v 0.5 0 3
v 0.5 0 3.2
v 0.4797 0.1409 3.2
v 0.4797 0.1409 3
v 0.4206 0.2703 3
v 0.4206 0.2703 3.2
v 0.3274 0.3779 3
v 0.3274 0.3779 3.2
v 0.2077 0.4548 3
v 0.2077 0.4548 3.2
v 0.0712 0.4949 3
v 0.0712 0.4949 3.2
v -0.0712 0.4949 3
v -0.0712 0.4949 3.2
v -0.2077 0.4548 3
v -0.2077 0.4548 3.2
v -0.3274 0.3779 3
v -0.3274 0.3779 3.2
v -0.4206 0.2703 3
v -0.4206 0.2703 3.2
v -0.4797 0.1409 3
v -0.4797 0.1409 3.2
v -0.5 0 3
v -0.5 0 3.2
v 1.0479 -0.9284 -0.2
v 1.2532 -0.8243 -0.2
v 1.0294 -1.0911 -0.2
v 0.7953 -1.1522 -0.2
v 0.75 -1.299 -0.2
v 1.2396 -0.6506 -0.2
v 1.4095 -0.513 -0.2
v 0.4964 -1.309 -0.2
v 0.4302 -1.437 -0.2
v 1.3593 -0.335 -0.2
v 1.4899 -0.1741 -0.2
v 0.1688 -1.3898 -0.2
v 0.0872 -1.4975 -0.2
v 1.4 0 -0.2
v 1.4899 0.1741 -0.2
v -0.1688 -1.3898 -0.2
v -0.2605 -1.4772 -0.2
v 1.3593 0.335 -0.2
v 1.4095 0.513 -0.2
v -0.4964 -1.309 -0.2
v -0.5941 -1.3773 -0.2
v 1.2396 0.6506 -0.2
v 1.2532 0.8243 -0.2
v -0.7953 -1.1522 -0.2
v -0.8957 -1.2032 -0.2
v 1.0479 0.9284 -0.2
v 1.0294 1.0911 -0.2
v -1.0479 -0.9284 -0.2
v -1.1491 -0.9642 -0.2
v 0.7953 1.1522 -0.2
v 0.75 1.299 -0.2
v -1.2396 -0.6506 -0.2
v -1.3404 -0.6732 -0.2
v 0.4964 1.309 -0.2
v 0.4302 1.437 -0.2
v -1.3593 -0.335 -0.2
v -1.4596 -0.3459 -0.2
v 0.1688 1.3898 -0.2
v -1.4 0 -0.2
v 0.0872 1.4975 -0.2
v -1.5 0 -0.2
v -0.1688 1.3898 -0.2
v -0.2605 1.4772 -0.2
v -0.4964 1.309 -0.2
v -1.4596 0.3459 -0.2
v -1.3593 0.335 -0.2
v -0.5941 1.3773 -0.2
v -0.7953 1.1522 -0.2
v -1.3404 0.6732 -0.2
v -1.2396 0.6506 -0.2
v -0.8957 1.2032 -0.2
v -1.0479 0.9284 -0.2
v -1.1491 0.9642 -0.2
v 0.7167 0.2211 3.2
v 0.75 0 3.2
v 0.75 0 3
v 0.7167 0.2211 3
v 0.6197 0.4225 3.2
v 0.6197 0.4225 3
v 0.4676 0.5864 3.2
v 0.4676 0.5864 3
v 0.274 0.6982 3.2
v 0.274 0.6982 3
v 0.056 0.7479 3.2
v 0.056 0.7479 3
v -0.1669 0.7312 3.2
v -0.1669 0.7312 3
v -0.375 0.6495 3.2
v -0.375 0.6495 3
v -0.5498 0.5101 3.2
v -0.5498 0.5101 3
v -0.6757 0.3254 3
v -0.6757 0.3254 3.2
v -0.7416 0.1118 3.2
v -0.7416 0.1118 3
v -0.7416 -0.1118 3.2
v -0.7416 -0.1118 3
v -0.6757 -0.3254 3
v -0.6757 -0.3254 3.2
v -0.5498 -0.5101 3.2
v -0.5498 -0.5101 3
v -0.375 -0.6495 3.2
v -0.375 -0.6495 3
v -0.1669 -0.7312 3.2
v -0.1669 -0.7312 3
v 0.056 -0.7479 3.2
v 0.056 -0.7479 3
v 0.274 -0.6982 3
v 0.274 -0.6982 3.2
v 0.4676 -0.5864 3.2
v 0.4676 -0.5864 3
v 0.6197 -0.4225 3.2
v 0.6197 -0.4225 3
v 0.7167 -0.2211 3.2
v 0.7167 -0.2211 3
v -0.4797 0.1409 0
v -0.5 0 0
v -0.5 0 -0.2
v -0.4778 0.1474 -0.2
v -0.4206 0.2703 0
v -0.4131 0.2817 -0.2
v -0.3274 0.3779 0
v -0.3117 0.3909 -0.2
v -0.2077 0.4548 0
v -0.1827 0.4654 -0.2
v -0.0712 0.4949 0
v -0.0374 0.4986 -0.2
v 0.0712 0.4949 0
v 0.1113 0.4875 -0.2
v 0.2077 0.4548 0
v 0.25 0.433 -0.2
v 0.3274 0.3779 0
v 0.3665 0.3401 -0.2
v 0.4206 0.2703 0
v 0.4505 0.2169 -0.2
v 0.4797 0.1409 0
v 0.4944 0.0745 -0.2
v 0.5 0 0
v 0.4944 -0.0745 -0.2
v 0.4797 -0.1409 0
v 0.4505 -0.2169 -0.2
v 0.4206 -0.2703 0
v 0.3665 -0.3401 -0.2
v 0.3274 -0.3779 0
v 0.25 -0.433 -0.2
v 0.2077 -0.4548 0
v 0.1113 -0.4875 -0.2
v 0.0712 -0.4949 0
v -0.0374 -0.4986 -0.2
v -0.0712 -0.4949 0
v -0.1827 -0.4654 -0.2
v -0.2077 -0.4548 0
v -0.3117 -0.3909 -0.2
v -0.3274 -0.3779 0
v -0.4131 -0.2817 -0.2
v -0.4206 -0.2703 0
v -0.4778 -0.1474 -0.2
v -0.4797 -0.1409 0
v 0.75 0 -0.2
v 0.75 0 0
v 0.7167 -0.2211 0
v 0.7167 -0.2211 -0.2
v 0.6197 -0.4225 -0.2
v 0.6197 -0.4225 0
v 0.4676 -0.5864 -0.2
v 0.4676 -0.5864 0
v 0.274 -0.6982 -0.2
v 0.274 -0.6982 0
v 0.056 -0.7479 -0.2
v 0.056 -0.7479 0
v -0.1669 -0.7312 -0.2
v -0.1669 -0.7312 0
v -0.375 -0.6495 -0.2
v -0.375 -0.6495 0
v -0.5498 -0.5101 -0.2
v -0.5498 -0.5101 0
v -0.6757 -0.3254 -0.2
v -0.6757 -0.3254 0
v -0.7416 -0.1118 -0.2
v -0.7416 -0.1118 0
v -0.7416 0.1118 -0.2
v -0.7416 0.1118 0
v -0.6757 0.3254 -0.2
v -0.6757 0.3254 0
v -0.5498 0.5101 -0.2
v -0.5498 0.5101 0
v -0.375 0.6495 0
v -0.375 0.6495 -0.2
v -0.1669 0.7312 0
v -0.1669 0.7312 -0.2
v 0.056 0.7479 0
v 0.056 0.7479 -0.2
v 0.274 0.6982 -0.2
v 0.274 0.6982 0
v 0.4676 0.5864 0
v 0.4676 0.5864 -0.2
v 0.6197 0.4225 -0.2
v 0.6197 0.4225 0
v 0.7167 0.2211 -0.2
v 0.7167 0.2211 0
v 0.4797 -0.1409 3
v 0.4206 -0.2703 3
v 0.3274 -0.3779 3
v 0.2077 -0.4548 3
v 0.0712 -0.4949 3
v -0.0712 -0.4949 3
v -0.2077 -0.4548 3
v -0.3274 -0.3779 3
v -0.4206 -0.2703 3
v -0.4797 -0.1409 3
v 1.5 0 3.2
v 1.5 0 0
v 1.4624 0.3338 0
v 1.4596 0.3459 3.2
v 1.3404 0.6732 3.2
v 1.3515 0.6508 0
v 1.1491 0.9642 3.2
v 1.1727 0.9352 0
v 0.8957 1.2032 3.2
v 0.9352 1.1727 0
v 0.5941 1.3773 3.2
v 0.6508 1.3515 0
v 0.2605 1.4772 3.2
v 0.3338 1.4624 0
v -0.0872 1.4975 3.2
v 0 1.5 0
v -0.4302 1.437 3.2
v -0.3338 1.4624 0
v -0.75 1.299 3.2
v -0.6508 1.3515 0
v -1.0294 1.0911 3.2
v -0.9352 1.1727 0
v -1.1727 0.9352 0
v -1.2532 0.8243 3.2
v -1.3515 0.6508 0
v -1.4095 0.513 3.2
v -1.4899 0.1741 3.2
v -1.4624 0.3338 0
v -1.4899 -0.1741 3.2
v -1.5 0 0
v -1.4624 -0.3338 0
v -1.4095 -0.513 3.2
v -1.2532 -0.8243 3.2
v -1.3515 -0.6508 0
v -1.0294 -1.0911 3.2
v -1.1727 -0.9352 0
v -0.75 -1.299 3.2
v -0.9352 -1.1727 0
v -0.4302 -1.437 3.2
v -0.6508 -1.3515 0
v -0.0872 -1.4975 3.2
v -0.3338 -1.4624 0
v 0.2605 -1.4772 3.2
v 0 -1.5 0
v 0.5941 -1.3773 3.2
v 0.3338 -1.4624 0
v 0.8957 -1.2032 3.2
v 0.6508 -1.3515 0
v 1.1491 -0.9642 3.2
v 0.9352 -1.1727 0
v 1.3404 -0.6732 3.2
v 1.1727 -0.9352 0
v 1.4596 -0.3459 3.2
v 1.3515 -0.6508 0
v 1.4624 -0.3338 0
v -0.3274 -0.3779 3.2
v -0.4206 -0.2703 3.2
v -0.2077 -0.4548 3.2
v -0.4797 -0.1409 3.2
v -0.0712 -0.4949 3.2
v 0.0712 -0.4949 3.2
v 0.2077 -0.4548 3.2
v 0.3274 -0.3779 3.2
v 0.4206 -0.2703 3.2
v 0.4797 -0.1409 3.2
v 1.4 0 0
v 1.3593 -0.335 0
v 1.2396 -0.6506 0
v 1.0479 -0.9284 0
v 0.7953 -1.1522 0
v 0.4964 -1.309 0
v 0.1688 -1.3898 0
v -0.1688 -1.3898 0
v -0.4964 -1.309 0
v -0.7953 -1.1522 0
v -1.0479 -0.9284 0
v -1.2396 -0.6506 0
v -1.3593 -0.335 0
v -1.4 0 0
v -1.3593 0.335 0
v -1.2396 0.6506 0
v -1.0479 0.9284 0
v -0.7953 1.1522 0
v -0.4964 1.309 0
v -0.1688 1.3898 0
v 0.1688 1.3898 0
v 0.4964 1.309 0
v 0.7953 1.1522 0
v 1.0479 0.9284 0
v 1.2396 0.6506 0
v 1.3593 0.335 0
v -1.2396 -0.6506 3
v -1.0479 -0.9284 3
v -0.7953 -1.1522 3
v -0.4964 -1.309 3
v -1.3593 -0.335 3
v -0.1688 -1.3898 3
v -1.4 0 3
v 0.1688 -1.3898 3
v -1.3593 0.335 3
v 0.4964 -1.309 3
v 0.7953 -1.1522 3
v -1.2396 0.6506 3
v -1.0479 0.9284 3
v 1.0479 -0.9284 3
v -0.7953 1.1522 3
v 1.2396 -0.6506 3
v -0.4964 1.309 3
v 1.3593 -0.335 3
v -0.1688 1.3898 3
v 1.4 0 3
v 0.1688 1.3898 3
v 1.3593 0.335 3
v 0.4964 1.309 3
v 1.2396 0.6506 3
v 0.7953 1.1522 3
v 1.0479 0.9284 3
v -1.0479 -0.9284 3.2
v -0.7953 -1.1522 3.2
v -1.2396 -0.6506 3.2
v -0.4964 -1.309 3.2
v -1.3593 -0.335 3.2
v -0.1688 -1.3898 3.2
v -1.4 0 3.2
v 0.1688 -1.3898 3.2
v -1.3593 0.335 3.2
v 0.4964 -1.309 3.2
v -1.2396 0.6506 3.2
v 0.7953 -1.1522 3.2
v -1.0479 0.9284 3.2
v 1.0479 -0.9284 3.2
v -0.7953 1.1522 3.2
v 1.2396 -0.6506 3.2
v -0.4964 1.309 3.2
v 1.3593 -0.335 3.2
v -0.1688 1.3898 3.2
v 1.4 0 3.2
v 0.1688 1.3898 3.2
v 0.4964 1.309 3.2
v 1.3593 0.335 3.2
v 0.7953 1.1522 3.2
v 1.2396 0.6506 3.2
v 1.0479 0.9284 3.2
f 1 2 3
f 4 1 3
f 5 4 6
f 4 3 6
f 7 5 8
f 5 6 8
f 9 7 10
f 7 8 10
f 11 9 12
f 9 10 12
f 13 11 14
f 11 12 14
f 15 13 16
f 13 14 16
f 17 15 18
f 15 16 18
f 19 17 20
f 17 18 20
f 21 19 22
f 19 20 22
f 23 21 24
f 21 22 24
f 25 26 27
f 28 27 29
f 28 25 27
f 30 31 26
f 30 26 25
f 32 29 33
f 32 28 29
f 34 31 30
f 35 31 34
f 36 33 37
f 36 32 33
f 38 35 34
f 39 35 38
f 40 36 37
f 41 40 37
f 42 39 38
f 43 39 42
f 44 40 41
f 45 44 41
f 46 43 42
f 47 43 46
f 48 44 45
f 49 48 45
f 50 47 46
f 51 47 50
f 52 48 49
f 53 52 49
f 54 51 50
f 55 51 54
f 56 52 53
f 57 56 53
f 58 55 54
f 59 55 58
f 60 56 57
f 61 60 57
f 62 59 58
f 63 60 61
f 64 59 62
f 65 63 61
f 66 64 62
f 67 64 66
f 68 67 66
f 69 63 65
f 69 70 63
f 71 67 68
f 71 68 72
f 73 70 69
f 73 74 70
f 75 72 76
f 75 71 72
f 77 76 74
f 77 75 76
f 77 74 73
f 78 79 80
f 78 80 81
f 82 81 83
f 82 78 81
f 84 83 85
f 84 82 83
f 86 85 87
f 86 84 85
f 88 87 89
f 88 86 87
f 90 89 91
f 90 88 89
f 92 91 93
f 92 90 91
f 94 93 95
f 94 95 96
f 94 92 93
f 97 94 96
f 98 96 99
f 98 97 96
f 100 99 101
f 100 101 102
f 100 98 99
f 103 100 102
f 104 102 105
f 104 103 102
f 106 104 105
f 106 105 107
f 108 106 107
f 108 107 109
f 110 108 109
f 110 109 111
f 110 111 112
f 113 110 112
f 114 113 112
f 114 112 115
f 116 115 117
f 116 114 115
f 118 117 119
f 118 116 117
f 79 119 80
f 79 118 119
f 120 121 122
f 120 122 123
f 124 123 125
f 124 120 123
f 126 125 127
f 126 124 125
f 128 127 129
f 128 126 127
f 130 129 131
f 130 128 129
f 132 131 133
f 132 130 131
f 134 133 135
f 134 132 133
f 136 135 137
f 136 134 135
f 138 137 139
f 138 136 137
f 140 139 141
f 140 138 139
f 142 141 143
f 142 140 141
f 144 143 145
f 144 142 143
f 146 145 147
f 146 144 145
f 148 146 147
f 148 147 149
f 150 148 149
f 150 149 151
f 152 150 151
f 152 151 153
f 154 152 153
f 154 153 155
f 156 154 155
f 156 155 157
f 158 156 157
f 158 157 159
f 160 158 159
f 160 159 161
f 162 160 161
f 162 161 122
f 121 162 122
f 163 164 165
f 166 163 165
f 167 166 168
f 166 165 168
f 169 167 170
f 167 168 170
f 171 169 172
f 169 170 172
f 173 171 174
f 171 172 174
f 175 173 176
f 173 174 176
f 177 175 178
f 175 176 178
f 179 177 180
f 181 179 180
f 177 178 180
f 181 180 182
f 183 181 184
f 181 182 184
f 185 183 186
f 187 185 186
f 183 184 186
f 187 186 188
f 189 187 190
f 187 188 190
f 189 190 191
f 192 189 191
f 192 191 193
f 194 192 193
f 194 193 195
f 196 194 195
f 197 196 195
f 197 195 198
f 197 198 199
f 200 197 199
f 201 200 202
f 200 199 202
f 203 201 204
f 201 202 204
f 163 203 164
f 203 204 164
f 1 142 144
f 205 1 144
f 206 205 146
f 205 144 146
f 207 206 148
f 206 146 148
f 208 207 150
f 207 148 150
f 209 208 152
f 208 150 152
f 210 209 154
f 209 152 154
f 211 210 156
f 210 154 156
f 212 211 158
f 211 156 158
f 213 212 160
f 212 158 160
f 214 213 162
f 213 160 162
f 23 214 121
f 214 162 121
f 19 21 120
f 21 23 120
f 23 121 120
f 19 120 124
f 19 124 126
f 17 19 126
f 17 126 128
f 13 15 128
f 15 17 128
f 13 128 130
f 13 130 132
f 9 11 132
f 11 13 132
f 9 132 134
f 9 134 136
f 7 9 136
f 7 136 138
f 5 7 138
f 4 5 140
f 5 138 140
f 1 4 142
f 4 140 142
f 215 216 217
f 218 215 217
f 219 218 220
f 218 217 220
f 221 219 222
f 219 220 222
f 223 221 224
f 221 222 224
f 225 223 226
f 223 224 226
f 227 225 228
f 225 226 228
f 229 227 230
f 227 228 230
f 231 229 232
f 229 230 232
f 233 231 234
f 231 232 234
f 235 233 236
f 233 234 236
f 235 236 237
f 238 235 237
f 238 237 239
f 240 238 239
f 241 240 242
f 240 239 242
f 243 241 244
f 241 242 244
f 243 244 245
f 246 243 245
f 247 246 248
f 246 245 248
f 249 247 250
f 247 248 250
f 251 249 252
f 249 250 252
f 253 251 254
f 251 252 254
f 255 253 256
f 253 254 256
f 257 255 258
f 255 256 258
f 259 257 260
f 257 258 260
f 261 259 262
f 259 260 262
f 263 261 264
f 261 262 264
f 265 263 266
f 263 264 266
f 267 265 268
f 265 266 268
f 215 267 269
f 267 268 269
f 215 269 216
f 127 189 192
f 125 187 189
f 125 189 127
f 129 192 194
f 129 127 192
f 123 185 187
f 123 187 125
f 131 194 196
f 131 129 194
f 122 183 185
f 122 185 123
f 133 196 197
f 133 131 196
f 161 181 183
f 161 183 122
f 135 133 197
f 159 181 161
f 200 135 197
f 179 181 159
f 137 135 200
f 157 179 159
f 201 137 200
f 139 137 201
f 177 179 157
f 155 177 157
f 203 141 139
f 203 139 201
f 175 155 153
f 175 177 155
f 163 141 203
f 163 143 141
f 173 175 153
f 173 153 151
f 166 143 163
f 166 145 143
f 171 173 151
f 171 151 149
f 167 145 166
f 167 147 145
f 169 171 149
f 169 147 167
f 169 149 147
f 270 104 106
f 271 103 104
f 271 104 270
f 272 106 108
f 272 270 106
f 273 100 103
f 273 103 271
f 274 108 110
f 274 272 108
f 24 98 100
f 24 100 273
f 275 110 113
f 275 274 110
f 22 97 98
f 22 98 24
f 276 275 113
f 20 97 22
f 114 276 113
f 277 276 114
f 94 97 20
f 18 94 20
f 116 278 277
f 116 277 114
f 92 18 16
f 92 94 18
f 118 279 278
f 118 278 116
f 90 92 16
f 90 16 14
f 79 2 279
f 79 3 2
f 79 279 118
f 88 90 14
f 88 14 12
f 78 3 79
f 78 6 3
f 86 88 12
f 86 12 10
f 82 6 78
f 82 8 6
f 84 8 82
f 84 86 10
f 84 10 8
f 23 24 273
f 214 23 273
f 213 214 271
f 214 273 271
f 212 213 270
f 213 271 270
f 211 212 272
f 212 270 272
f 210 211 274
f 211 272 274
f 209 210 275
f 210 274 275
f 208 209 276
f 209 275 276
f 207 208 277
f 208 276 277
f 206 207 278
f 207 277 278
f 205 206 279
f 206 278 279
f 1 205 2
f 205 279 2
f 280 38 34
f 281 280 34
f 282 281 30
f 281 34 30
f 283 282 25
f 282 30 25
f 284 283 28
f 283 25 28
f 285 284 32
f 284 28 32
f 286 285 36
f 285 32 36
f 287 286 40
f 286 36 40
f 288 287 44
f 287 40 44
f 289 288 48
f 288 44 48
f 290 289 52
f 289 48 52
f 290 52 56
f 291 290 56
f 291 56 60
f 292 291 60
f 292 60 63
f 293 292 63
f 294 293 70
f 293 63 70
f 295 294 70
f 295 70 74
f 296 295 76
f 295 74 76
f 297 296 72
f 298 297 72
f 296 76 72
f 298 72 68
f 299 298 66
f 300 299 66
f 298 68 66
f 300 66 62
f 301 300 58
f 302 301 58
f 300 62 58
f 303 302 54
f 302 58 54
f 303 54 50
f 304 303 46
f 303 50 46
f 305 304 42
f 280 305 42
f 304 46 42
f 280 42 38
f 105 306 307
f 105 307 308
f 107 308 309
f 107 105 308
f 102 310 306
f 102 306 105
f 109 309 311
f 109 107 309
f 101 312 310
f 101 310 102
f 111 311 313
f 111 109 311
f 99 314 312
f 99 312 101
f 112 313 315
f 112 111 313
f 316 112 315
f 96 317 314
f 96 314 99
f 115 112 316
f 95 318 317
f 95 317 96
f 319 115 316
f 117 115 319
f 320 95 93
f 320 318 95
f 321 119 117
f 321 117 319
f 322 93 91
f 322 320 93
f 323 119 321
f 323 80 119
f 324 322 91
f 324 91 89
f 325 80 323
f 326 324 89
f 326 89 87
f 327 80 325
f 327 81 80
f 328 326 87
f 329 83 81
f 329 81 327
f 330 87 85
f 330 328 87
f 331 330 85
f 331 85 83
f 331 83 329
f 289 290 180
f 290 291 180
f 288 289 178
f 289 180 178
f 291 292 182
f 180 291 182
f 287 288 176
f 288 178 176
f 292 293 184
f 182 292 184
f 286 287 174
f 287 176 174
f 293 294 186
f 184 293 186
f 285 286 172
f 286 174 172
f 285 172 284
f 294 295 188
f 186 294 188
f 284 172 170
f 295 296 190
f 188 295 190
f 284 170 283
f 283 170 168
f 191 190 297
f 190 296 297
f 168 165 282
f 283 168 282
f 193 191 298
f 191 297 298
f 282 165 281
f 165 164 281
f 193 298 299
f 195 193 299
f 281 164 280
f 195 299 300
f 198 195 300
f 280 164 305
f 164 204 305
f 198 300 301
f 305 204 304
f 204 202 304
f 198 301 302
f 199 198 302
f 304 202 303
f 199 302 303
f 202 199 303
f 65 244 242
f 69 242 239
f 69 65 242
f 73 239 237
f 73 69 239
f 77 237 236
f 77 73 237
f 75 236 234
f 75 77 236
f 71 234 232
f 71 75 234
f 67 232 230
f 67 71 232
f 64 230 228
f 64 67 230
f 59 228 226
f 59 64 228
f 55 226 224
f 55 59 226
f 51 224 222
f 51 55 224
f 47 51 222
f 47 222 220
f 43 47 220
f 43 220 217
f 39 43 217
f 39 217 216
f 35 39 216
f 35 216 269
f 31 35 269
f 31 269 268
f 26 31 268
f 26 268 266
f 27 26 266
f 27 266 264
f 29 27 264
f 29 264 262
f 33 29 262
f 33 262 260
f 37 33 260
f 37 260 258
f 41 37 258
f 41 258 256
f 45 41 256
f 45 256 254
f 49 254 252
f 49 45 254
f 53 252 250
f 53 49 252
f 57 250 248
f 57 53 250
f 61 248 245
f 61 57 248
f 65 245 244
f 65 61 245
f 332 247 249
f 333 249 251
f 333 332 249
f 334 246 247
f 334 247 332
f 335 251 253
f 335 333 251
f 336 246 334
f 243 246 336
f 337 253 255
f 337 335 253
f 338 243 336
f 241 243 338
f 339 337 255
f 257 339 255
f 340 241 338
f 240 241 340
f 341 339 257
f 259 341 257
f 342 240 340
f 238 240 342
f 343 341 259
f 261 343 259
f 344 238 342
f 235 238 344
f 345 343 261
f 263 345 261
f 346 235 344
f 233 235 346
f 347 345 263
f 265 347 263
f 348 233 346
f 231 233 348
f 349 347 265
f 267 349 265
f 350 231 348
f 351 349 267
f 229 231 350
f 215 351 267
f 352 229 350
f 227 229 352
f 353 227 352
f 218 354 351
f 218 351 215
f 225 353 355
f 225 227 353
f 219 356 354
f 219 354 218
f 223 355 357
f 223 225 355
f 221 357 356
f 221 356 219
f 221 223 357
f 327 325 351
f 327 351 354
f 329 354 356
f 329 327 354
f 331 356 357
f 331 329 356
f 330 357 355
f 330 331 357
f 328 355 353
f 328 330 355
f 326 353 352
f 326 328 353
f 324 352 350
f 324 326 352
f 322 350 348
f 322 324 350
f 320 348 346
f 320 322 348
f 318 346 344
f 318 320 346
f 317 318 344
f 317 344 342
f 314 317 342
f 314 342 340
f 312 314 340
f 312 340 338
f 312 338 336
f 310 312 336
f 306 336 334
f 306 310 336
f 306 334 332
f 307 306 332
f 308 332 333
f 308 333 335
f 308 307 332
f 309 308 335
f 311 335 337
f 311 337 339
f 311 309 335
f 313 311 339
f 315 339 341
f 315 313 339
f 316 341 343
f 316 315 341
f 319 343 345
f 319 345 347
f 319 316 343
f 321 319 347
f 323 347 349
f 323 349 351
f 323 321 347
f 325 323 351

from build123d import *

# Parameters (mm, degrees)
SKETCH_1_R          = 1.5
EXTRUDE_1_DEPTH     = 3
SKETCH_2_R          = 1.5
SKETCH_2_R_2        = 1.4
EXTRUDE_2_DEPTH     = 0.2
EXTRUDE_START       = 0.2
SKETCH_3_R          = 1.5
SKETCH_3_R_2        = 1.4
EXTRUDE_3_DEPTH     = 0.2
SKETCH_4_R          = 0.75
SKETCH_4_R_2        = 0.5
EXTRUDE_4_DEPTH     = 0.2
SKETCH_5_R          = 0.75
SKETCH_5_R_2        = 0.5
EXTRUDE_5_DEPTH     = 0.2
SKETCH_7_R          = 0.5
CUT_EXTRUDE_2_DEPTH = 4.839270764


with BuildPart() as part:
    # 草图1 → 凸台-拉伸1 (new body)
    with BuildSketch(Plane.XY):
        Circle(SKETCH_1_R)
    extrude(amount=EXTRUDE_1_DEPTH)

    # 草图2 → 凸台-拉伸2 (add)
    with BuildSketch(Plane.XY.offset(3)):
        Circle(SKETCH_2_R)
        Circle(SKETCH_2_R_2, mode=Mode.SUBTRACT)
    extrude(amount=EXTRUDE_2_DEPTH)

    # 草图3 → 凸台-拉伸3 (add)
    with BuildSketch(Plane(origin=(0, 0, 0), x_dir=(-1, 0, 0), z_dir=(0, 0, -1)).offset(EXTRUDE_START)):
        Circle(SKETCH_3_R)
        Circle(SKETCH_3_R_2, mode=Mode.SUBTRACT)
    extrude(amount=-EXTRUDE_3_DEPTH)

    # 草图4 → 凸台-拉伸4 (add)
    with BuildSketch(Plane(origin=(0, 0, 0), x_dir=(-1, 0, 0), z_dir=(0, 0, -1))):
        Circle(SKETCH_4_R)
        Circle(SKETCH_4_R_2, mode=Mode.SUBTRACT)
    extrude(amount=EXTRUDE_4_DEPTH)

    # 草图5 → 凸台-拉伸5 (add)
    with BuildSketch(Plane.XY.offset(3).offset(EXTRUDE_START)):
        Circle(SKETCH_5_R)
        Circle(SKETCH_5_R_2, mode=Mode.SUBTRACT)
    extrude(amount=-EXTRUDE_5_DEPTH)

    # 草图7 → 切除-拉伸2 (cut, through all)
    with BuildSketch(Plane(origin=(0, 0, 0), x_dir=(-1, 0, 0), z_dir=(0, 0, -1))):
        Circle(SKETCH_7_R)
    extrude(amount=-CUT_EXTRUDE_2_DEPTH, mode=Mode.SUBTRACT)


solid = part.part
